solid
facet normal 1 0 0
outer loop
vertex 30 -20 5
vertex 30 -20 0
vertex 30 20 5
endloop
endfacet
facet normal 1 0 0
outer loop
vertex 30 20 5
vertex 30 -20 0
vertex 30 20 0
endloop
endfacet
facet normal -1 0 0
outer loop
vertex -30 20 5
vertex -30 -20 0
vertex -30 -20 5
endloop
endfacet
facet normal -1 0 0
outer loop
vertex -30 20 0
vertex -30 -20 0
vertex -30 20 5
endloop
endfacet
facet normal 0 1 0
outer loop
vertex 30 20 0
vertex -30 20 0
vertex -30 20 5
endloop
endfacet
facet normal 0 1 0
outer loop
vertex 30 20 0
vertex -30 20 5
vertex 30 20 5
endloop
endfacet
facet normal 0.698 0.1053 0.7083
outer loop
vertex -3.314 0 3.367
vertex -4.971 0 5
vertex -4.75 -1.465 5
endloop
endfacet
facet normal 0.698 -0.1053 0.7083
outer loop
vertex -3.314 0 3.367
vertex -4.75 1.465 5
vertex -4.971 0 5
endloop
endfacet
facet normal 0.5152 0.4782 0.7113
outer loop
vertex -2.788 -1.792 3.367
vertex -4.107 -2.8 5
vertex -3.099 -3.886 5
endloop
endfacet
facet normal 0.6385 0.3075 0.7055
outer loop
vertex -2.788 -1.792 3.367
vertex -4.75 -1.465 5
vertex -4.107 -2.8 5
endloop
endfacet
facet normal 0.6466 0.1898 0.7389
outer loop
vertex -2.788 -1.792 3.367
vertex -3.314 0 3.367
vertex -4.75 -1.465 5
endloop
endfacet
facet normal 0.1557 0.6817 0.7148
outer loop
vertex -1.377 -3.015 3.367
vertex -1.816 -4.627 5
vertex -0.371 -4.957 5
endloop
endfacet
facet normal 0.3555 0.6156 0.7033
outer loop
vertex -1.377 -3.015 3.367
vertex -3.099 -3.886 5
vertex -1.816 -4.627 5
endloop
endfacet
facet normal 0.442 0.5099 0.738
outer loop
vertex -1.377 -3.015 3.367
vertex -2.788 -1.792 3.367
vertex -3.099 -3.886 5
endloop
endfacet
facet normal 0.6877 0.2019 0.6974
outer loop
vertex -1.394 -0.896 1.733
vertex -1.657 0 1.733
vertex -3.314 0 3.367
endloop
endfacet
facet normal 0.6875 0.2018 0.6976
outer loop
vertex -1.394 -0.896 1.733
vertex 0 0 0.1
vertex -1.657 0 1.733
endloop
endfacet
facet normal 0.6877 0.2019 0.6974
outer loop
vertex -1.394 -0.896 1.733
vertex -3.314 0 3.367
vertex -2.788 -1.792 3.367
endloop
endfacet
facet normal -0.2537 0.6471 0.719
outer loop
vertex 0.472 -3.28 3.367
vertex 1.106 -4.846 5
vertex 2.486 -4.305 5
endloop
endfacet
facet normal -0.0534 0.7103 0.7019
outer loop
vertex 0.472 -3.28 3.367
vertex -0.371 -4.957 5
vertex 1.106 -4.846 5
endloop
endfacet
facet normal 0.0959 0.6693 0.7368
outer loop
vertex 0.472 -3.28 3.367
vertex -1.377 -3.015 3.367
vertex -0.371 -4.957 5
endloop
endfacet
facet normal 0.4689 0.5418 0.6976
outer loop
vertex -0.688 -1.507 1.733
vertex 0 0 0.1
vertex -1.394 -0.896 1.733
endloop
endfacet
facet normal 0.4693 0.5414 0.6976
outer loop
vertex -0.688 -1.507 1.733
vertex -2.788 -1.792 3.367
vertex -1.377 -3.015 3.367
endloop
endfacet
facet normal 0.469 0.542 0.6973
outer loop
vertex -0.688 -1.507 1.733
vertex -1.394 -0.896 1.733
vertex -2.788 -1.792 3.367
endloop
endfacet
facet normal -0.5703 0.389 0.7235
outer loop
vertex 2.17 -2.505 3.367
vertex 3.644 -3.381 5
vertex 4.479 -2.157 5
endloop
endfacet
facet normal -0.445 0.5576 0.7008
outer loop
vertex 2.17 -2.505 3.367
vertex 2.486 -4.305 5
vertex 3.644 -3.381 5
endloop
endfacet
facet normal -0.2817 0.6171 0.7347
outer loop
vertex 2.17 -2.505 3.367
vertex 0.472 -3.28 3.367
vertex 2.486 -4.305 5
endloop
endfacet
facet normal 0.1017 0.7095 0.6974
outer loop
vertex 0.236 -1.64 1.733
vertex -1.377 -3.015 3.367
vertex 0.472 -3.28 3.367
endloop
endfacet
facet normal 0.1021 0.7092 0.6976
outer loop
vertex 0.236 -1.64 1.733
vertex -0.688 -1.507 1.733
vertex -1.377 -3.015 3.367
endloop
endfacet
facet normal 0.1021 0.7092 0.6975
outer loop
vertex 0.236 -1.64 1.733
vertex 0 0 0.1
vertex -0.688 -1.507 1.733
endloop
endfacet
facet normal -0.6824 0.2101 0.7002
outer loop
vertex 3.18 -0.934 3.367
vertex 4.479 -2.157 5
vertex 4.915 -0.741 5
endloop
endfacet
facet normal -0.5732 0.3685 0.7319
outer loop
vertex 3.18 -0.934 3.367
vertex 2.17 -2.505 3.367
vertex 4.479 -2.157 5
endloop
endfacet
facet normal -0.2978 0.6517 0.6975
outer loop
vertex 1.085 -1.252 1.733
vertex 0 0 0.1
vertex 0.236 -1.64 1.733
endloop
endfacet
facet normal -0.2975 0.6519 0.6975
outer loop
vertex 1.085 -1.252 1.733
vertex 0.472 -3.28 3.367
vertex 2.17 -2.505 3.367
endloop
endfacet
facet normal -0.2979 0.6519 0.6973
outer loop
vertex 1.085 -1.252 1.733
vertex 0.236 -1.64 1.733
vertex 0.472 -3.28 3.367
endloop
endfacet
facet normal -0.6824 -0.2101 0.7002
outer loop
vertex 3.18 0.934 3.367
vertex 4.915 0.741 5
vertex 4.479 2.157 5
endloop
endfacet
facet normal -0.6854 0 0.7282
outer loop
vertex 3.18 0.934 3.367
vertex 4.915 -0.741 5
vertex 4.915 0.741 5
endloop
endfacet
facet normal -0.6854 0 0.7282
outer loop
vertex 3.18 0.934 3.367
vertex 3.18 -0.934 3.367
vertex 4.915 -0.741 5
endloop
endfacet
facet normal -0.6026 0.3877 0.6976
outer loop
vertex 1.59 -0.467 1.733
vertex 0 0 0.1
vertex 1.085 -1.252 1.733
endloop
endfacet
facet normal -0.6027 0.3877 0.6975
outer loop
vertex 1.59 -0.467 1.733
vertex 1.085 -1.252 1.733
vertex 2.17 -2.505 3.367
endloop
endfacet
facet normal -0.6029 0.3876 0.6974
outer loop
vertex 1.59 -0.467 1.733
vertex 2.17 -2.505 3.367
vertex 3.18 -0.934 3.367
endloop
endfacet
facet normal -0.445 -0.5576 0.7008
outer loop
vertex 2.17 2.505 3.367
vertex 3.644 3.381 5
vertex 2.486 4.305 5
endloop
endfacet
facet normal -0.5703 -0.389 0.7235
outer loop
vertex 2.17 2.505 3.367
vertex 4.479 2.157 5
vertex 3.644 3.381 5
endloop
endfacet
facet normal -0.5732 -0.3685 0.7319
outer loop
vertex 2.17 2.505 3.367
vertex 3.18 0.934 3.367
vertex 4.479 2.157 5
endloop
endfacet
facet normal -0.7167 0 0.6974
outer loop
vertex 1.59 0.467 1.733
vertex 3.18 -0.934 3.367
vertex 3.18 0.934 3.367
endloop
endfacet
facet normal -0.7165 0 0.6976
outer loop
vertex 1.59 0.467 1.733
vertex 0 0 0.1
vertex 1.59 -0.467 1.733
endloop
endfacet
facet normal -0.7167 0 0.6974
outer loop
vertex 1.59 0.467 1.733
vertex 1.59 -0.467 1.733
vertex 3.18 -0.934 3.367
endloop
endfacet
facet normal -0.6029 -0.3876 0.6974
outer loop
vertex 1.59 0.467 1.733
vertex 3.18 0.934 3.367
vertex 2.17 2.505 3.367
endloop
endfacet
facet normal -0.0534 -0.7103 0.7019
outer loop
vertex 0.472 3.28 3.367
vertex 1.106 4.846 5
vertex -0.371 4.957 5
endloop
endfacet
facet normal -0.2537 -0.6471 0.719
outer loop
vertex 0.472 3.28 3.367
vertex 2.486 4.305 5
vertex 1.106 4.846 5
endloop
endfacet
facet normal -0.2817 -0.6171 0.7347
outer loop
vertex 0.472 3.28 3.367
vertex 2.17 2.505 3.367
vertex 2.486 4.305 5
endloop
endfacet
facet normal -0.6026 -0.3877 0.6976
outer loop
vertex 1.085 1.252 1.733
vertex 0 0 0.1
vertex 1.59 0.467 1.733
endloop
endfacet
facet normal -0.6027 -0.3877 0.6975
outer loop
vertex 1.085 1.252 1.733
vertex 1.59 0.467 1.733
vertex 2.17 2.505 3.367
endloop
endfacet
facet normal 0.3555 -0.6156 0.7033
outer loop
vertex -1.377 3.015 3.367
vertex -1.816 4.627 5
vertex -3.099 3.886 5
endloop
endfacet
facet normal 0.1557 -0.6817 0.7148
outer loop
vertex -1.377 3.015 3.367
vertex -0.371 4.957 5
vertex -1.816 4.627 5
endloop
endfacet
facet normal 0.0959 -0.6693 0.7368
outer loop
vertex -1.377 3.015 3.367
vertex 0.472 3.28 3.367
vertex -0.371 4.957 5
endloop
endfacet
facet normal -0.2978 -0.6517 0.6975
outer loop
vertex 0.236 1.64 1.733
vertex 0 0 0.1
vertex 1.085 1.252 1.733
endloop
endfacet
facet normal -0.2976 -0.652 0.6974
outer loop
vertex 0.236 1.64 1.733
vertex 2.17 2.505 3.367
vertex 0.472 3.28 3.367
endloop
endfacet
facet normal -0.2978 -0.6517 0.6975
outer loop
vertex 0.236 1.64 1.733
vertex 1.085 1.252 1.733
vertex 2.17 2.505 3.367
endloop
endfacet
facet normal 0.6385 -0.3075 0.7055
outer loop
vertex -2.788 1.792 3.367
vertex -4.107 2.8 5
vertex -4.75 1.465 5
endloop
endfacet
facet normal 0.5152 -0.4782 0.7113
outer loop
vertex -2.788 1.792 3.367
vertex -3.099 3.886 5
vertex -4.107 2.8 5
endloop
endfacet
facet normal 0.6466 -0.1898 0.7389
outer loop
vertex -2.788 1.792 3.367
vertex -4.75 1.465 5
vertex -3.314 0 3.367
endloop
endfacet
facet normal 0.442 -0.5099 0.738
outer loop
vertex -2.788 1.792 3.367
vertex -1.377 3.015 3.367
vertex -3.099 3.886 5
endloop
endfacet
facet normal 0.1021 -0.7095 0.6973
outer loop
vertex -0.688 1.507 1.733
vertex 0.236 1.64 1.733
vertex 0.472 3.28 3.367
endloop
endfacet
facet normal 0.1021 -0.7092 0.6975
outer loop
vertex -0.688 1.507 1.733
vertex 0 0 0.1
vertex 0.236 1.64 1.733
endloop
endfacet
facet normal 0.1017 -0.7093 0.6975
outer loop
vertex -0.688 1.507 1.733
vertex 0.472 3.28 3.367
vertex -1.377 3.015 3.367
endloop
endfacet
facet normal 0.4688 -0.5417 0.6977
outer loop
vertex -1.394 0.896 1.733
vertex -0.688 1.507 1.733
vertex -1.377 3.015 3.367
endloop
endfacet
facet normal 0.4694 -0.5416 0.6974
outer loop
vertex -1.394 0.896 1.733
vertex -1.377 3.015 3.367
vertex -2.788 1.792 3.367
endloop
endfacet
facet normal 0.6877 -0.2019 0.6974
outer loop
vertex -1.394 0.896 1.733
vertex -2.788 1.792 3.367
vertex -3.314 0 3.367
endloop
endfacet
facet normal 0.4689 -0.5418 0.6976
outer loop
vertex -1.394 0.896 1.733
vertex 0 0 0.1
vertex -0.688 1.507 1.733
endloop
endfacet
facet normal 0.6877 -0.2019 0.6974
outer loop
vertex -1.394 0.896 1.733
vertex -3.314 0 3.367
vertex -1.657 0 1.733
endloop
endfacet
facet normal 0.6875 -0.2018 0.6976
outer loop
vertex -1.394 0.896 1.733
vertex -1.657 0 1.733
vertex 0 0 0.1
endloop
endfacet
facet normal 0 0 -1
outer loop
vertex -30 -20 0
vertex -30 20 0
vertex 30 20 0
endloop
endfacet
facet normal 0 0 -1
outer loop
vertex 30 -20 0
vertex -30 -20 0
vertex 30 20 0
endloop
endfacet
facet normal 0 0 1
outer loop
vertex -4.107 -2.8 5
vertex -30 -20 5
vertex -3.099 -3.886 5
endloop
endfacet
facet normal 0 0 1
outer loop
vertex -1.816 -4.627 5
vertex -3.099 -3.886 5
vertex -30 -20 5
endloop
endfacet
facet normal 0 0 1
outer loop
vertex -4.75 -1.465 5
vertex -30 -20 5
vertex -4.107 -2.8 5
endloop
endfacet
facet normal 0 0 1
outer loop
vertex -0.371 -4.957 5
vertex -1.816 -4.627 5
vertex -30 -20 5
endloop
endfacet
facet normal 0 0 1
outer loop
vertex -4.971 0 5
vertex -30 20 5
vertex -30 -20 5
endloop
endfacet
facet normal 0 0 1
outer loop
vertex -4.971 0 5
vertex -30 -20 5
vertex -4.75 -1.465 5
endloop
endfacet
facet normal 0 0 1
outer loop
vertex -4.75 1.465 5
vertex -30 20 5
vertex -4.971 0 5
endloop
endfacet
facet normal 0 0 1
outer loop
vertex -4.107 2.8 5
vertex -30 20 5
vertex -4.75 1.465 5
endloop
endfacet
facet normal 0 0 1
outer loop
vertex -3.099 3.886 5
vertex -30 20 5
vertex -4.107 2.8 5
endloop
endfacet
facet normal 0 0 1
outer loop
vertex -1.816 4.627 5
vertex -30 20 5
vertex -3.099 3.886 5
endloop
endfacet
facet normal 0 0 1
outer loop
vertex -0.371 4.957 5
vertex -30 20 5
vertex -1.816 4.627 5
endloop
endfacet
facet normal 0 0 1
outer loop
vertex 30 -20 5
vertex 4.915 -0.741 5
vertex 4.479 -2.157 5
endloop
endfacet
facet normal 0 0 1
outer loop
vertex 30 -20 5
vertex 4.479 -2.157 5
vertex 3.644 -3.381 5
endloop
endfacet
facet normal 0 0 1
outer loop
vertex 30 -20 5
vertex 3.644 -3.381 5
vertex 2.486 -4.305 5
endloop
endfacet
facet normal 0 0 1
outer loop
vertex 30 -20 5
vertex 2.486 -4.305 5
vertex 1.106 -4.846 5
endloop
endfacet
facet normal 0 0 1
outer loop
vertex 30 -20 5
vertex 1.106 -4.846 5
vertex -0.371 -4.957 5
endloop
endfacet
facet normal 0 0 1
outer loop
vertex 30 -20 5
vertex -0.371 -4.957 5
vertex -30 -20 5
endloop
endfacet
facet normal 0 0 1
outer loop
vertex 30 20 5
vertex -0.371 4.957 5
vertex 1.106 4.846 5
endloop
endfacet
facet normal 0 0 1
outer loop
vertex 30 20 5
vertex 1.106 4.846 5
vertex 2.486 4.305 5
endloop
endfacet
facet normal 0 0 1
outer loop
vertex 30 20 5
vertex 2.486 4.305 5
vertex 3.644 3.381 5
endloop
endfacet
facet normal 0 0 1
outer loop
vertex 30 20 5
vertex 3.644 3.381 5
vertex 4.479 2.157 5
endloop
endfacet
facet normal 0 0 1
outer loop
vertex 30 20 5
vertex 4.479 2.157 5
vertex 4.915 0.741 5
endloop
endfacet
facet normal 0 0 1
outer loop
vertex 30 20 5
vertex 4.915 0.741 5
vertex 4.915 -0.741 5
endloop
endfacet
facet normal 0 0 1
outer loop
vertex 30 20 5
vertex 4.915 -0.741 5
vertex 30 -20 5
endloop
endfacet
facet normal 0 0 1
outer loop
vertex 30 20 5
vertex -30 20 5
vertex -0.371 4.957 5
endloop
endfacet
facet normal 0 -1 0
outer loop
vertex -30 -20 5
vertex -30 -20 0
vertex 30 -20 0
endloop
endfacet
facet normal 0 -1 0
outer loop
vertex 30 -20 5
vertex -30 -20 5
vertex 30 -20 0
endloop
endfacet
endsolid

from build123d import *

# Parameters (mm, degrees)
F0_W     = 60
F0_H     = 40
F1_DEPTH = 5


with BuildPart() as f1:
    # F0 (on Top) → F1 (new body)
    with BuildSketch(Plane.XY):
        Rectangle(F0_W, F0_H)
    extrude(amount=F1_DEPTH)

    # F2 (on Front) → F3 (revolve, cut)
    with BuildSketch(Plane.XZ):
        Polygon((0, 7), (-7, 7), (0, 0.1), align=None)
    revolve(axis=Axis((0, 0, 3.55), (0, 0, 1)), mode=Mode.SUBTRACT)


solid = f1.part
